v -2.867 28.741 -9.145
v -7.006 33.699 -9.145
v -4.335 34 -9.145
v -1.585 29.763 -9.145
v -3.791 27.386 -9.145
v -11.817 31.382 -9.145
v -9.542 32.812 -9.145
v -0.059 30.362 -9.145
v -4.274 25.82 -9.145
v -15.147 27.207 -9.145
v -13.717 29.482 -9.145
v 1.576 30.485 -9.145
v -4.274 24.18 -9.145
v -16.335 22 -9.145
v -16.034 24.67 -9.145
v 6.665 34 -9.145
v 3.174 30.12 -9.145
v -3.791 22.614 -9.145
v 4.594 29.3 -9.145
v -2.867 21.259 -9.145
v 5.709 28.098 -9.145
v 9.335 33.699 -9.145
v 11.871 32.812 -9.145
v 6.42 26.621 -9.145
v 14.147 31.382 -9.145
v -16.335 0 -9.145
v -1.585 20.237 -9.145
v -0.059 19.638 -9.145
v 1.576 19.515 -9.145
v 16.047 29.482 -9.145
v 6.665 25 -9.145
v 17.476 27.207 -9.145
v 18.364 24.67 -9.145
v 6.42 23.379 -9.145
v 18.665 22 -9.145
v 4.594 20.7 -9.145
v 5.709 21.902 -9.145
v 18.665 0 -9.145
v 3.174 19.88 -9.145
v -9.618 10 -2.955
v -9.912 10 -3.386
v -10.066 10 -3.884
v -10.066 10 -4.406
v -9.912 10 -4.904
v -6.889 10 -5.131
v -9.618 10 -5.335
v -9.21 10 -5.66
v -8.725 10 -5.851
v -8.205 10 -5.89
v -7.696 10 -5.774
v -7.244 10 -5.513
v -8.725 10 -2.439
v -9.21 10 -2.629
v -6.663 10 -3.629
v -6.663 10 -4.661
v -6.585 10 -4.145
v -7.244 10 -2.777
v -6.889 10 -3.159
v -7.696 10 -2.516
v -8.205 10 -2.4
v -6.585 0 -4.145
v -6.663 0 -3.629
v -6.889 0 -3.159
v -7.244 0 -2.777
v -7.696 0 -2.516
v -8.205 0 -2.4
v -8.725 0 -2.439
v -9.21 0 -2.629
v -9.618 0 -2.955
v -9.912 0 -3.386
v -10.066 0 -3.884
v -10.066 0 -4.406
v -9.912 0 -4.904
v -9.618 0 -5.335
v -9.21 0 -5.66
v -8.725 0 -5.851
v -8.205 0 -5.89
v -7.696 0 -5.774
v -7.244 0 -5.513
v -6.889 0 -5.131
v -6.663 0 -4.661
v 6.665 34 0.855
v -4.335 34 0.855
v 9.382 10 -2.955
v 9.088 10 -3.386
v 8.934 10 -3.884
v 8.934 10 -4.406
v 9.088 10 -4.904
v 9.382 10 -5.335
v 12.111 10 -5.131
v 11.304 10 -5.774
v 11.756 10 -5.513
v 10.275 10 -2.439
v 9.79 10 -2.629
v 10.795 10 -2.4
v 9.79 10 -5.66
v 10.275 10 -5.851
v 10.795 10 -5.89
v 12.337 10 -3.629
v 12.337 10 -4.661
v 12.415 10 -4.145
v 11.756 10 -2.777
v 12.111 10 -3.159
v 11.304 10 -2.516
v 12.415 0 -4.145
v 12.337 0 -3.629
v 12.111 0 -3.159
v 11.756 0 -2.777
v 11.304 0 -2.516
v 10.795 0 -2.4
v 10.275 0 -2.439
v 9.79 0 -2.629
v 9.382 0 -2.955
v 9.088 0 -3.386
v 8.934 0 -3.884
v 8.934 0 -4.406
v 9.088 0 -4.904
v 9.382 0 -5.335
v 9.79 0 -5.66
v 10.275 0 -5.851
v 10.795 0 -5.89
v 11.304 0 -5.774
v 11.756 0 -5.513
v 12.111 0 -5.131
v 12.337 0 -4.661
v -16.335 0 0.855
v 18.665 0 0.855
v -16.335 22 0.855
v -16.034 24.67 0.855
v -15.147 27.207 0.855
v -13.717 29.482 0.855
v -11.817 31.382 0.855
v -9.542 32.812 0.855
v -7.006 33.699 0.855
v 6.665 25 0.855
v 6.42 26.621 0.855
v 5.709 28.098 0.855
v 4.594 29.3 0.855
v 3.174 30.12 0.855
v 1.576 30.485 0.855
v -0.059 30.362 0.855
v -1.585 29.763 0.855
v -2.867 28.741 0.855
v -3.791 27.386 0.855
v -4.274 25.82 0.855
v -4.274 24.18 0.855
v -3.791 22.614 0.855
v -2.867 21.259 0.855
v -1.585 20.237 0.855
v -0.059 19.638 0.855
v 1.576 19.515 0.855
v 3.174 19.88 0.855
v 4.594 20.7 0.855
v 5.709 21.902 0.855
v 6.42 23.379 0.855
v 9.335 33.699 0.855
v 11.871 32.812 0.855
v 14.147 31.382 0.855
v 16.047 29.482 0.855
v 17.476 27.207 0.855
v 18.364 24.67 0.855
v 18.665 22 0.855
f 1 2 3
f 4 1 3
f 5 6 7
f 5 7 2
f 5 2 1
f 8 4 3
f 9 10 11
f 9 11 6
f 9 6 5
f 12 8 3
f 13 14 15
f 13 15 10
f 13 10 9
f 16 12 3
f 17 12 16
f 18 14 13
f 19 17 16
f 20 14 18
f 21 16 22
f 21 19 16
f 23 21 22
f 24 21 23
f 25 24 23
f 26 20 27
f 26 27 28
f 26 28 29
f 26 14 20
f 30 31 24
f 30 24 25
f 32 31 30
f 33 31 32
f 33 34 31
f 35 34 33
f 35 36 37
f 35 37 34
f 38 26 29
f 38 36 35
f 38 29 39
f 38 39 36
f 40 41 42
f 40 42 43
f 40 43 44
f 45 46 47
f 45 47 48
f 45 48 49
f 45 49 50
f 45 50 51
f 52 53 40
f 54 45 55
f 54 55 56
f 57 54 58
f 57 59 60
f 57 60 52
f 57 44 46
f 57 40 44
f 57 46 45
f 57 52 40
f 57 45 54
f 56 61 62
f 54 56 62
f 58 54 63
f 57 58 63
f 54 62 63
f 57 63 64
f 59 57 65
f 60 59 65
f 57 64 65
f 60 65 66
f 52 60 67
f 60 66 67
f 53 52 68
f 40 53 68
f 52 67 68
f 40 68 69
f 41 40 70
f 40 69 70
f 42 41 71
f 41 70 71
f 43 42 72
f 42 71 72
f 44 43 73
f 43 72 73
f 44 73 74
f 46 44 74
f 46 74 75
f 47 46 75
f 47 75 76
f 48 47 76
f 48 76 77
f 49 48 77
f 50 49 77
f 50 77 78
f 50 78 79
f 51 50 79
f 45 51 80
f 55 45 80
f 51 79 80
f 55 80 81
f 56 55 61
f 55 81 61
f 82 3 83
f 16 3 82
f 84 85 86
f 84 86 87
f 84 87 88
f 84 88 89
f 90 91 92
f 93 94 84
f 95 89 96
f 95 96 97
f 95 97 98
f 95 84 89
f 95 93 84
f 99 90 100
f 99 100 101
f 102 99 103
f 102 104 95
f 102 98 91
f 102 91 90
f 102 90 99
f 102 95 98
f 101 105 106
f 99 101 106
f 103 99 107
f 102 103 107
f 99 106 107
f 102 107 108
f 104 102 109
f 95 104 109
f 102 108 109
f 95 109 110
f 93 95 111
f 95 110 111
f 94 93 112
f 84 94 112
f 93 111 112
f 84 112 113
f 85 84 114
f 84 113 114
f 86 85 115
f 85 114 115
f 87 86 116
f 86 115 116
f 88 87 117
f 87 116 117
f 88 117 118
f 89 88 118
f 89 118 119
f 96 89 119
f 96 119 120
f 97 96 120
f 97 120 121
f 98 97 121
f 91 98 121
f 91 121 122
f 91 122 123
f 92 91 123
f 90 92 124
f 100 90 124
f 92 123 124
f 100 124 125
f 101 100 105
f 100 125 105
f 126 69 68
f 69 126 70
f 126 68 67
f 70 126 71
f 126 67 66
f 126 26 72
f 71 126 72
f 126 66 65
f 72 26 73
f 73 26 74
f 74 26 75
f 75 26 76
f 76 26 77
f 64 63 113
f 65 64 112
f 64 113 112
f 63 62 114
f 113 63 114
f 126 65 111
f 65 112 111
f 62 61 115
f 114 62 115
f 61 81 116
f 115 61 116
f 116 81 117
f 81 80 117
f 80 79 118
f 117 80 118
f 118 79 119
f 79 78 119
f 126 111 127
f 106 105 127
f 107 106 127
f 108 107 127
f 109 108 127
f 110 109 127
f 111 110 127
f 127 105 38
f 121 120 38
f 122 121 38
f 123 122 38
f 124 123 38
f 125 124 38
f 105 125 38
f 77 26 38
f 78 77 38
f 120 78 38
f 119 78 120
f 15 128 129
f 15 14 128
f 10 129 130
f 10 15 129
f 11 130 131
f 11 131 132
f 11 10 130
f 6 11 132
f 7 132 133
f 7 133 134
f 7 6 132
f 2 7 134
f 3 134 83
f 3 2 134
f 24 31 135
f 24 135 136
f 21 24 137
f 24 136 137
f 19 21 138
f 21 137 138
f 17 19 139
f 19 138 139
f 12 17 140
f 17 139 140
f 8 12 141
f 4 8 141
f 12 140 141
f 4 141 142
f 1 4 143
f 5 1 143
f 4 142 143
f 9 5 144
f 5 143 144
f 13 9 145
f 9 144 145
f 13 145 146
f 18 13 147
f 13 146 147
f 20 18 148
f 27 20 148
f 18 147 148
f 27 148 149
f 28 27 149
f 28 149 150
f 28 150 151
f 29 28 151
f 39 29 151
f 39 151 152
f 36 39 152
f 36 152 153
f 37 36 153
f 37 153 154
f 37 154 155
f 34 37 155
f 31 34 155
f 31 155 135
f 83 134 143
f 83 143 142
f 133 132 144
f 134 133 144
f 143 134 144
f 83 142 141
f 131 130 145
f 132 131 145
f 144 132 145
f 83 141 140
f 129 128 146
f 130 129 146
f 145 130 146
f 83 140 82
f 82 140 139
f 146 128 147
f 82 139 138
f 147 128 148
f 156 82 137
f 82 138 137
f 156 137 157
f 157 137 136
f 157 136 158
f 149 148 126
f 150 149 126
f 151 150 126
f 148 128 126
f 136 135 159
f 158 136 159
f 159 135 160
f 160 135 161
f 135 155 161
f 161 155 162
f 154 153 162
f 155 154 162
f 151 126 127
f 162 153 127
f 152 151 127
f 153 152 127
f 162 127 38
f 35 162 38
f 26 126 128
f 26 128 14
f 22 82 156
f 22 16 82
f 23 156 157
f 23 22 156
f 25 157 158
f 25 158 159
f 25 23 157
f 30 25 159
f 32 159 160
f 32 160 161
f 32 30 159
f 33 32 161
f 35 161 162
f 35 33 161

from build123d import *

# Parameters (mm, degrees)
SKETCH1_W           = 35
SKETCH1_H           = 10
BOSS_EXTRUDE1_DEPTH = 34
SKETCH2_R           = 5.5
CUT_EXTRUDE1_DEPTH  = 11
SKETCH3_R           = 1.75
CUT_EXTRUDE2_DEPTH  = 10
FILLET1_R           = 12


with BuildPart() as part:
    # Sketch1 → Boss-Extrude1 (new body)
    with BuildSketch(Plane(origin=(0, 0, 0), x_dir=(1, 0, 0), z_dir=(0, 1, 0))):
        with Locations((1.164675851, 4.144829176)):
            Rectangle(SKETCH1_W, SKETCH1_H)
    extrude(amount=BOSS_EXTRUDE1_DEPTH)

    # Sketch2 → Cut-Extrude1 (cut, through all)
    with BuildSketch(Plane.XY.offset(0.855170824)):
        with Locations((1.164675851, 25)):
            Circle(SKETCH2_R)
    extrude(amount=-CUT_EXTRUDE1_DEPTH, mode=Mode.SUBTRACT)

    # Sketch3 → Cut-Extrude2 (cut)
    with BuildSketch(Plane.XZ):
        with Locations((-8.335324149, -4.144829176)):
            Circle(SKETCH3_R)
        with Locations((10.664675851, -4.144829176)):
            Circle(SKETCH3_R)
    extrude(amount=-CUT_EXTRUDE2_DEPTH, mode=Mode.SUBTRACT)

    # Fillet1
    fillet1_edges = [part.edges().sort_by_distance(p)[0] for p in [
        (18.664675851, 34, -4.144829176),
        (-16.335324149, 34, -4.144829176),
    ]]
    fillet(fillet1_edges, radius=FILLET1_R)


solid = part.part
